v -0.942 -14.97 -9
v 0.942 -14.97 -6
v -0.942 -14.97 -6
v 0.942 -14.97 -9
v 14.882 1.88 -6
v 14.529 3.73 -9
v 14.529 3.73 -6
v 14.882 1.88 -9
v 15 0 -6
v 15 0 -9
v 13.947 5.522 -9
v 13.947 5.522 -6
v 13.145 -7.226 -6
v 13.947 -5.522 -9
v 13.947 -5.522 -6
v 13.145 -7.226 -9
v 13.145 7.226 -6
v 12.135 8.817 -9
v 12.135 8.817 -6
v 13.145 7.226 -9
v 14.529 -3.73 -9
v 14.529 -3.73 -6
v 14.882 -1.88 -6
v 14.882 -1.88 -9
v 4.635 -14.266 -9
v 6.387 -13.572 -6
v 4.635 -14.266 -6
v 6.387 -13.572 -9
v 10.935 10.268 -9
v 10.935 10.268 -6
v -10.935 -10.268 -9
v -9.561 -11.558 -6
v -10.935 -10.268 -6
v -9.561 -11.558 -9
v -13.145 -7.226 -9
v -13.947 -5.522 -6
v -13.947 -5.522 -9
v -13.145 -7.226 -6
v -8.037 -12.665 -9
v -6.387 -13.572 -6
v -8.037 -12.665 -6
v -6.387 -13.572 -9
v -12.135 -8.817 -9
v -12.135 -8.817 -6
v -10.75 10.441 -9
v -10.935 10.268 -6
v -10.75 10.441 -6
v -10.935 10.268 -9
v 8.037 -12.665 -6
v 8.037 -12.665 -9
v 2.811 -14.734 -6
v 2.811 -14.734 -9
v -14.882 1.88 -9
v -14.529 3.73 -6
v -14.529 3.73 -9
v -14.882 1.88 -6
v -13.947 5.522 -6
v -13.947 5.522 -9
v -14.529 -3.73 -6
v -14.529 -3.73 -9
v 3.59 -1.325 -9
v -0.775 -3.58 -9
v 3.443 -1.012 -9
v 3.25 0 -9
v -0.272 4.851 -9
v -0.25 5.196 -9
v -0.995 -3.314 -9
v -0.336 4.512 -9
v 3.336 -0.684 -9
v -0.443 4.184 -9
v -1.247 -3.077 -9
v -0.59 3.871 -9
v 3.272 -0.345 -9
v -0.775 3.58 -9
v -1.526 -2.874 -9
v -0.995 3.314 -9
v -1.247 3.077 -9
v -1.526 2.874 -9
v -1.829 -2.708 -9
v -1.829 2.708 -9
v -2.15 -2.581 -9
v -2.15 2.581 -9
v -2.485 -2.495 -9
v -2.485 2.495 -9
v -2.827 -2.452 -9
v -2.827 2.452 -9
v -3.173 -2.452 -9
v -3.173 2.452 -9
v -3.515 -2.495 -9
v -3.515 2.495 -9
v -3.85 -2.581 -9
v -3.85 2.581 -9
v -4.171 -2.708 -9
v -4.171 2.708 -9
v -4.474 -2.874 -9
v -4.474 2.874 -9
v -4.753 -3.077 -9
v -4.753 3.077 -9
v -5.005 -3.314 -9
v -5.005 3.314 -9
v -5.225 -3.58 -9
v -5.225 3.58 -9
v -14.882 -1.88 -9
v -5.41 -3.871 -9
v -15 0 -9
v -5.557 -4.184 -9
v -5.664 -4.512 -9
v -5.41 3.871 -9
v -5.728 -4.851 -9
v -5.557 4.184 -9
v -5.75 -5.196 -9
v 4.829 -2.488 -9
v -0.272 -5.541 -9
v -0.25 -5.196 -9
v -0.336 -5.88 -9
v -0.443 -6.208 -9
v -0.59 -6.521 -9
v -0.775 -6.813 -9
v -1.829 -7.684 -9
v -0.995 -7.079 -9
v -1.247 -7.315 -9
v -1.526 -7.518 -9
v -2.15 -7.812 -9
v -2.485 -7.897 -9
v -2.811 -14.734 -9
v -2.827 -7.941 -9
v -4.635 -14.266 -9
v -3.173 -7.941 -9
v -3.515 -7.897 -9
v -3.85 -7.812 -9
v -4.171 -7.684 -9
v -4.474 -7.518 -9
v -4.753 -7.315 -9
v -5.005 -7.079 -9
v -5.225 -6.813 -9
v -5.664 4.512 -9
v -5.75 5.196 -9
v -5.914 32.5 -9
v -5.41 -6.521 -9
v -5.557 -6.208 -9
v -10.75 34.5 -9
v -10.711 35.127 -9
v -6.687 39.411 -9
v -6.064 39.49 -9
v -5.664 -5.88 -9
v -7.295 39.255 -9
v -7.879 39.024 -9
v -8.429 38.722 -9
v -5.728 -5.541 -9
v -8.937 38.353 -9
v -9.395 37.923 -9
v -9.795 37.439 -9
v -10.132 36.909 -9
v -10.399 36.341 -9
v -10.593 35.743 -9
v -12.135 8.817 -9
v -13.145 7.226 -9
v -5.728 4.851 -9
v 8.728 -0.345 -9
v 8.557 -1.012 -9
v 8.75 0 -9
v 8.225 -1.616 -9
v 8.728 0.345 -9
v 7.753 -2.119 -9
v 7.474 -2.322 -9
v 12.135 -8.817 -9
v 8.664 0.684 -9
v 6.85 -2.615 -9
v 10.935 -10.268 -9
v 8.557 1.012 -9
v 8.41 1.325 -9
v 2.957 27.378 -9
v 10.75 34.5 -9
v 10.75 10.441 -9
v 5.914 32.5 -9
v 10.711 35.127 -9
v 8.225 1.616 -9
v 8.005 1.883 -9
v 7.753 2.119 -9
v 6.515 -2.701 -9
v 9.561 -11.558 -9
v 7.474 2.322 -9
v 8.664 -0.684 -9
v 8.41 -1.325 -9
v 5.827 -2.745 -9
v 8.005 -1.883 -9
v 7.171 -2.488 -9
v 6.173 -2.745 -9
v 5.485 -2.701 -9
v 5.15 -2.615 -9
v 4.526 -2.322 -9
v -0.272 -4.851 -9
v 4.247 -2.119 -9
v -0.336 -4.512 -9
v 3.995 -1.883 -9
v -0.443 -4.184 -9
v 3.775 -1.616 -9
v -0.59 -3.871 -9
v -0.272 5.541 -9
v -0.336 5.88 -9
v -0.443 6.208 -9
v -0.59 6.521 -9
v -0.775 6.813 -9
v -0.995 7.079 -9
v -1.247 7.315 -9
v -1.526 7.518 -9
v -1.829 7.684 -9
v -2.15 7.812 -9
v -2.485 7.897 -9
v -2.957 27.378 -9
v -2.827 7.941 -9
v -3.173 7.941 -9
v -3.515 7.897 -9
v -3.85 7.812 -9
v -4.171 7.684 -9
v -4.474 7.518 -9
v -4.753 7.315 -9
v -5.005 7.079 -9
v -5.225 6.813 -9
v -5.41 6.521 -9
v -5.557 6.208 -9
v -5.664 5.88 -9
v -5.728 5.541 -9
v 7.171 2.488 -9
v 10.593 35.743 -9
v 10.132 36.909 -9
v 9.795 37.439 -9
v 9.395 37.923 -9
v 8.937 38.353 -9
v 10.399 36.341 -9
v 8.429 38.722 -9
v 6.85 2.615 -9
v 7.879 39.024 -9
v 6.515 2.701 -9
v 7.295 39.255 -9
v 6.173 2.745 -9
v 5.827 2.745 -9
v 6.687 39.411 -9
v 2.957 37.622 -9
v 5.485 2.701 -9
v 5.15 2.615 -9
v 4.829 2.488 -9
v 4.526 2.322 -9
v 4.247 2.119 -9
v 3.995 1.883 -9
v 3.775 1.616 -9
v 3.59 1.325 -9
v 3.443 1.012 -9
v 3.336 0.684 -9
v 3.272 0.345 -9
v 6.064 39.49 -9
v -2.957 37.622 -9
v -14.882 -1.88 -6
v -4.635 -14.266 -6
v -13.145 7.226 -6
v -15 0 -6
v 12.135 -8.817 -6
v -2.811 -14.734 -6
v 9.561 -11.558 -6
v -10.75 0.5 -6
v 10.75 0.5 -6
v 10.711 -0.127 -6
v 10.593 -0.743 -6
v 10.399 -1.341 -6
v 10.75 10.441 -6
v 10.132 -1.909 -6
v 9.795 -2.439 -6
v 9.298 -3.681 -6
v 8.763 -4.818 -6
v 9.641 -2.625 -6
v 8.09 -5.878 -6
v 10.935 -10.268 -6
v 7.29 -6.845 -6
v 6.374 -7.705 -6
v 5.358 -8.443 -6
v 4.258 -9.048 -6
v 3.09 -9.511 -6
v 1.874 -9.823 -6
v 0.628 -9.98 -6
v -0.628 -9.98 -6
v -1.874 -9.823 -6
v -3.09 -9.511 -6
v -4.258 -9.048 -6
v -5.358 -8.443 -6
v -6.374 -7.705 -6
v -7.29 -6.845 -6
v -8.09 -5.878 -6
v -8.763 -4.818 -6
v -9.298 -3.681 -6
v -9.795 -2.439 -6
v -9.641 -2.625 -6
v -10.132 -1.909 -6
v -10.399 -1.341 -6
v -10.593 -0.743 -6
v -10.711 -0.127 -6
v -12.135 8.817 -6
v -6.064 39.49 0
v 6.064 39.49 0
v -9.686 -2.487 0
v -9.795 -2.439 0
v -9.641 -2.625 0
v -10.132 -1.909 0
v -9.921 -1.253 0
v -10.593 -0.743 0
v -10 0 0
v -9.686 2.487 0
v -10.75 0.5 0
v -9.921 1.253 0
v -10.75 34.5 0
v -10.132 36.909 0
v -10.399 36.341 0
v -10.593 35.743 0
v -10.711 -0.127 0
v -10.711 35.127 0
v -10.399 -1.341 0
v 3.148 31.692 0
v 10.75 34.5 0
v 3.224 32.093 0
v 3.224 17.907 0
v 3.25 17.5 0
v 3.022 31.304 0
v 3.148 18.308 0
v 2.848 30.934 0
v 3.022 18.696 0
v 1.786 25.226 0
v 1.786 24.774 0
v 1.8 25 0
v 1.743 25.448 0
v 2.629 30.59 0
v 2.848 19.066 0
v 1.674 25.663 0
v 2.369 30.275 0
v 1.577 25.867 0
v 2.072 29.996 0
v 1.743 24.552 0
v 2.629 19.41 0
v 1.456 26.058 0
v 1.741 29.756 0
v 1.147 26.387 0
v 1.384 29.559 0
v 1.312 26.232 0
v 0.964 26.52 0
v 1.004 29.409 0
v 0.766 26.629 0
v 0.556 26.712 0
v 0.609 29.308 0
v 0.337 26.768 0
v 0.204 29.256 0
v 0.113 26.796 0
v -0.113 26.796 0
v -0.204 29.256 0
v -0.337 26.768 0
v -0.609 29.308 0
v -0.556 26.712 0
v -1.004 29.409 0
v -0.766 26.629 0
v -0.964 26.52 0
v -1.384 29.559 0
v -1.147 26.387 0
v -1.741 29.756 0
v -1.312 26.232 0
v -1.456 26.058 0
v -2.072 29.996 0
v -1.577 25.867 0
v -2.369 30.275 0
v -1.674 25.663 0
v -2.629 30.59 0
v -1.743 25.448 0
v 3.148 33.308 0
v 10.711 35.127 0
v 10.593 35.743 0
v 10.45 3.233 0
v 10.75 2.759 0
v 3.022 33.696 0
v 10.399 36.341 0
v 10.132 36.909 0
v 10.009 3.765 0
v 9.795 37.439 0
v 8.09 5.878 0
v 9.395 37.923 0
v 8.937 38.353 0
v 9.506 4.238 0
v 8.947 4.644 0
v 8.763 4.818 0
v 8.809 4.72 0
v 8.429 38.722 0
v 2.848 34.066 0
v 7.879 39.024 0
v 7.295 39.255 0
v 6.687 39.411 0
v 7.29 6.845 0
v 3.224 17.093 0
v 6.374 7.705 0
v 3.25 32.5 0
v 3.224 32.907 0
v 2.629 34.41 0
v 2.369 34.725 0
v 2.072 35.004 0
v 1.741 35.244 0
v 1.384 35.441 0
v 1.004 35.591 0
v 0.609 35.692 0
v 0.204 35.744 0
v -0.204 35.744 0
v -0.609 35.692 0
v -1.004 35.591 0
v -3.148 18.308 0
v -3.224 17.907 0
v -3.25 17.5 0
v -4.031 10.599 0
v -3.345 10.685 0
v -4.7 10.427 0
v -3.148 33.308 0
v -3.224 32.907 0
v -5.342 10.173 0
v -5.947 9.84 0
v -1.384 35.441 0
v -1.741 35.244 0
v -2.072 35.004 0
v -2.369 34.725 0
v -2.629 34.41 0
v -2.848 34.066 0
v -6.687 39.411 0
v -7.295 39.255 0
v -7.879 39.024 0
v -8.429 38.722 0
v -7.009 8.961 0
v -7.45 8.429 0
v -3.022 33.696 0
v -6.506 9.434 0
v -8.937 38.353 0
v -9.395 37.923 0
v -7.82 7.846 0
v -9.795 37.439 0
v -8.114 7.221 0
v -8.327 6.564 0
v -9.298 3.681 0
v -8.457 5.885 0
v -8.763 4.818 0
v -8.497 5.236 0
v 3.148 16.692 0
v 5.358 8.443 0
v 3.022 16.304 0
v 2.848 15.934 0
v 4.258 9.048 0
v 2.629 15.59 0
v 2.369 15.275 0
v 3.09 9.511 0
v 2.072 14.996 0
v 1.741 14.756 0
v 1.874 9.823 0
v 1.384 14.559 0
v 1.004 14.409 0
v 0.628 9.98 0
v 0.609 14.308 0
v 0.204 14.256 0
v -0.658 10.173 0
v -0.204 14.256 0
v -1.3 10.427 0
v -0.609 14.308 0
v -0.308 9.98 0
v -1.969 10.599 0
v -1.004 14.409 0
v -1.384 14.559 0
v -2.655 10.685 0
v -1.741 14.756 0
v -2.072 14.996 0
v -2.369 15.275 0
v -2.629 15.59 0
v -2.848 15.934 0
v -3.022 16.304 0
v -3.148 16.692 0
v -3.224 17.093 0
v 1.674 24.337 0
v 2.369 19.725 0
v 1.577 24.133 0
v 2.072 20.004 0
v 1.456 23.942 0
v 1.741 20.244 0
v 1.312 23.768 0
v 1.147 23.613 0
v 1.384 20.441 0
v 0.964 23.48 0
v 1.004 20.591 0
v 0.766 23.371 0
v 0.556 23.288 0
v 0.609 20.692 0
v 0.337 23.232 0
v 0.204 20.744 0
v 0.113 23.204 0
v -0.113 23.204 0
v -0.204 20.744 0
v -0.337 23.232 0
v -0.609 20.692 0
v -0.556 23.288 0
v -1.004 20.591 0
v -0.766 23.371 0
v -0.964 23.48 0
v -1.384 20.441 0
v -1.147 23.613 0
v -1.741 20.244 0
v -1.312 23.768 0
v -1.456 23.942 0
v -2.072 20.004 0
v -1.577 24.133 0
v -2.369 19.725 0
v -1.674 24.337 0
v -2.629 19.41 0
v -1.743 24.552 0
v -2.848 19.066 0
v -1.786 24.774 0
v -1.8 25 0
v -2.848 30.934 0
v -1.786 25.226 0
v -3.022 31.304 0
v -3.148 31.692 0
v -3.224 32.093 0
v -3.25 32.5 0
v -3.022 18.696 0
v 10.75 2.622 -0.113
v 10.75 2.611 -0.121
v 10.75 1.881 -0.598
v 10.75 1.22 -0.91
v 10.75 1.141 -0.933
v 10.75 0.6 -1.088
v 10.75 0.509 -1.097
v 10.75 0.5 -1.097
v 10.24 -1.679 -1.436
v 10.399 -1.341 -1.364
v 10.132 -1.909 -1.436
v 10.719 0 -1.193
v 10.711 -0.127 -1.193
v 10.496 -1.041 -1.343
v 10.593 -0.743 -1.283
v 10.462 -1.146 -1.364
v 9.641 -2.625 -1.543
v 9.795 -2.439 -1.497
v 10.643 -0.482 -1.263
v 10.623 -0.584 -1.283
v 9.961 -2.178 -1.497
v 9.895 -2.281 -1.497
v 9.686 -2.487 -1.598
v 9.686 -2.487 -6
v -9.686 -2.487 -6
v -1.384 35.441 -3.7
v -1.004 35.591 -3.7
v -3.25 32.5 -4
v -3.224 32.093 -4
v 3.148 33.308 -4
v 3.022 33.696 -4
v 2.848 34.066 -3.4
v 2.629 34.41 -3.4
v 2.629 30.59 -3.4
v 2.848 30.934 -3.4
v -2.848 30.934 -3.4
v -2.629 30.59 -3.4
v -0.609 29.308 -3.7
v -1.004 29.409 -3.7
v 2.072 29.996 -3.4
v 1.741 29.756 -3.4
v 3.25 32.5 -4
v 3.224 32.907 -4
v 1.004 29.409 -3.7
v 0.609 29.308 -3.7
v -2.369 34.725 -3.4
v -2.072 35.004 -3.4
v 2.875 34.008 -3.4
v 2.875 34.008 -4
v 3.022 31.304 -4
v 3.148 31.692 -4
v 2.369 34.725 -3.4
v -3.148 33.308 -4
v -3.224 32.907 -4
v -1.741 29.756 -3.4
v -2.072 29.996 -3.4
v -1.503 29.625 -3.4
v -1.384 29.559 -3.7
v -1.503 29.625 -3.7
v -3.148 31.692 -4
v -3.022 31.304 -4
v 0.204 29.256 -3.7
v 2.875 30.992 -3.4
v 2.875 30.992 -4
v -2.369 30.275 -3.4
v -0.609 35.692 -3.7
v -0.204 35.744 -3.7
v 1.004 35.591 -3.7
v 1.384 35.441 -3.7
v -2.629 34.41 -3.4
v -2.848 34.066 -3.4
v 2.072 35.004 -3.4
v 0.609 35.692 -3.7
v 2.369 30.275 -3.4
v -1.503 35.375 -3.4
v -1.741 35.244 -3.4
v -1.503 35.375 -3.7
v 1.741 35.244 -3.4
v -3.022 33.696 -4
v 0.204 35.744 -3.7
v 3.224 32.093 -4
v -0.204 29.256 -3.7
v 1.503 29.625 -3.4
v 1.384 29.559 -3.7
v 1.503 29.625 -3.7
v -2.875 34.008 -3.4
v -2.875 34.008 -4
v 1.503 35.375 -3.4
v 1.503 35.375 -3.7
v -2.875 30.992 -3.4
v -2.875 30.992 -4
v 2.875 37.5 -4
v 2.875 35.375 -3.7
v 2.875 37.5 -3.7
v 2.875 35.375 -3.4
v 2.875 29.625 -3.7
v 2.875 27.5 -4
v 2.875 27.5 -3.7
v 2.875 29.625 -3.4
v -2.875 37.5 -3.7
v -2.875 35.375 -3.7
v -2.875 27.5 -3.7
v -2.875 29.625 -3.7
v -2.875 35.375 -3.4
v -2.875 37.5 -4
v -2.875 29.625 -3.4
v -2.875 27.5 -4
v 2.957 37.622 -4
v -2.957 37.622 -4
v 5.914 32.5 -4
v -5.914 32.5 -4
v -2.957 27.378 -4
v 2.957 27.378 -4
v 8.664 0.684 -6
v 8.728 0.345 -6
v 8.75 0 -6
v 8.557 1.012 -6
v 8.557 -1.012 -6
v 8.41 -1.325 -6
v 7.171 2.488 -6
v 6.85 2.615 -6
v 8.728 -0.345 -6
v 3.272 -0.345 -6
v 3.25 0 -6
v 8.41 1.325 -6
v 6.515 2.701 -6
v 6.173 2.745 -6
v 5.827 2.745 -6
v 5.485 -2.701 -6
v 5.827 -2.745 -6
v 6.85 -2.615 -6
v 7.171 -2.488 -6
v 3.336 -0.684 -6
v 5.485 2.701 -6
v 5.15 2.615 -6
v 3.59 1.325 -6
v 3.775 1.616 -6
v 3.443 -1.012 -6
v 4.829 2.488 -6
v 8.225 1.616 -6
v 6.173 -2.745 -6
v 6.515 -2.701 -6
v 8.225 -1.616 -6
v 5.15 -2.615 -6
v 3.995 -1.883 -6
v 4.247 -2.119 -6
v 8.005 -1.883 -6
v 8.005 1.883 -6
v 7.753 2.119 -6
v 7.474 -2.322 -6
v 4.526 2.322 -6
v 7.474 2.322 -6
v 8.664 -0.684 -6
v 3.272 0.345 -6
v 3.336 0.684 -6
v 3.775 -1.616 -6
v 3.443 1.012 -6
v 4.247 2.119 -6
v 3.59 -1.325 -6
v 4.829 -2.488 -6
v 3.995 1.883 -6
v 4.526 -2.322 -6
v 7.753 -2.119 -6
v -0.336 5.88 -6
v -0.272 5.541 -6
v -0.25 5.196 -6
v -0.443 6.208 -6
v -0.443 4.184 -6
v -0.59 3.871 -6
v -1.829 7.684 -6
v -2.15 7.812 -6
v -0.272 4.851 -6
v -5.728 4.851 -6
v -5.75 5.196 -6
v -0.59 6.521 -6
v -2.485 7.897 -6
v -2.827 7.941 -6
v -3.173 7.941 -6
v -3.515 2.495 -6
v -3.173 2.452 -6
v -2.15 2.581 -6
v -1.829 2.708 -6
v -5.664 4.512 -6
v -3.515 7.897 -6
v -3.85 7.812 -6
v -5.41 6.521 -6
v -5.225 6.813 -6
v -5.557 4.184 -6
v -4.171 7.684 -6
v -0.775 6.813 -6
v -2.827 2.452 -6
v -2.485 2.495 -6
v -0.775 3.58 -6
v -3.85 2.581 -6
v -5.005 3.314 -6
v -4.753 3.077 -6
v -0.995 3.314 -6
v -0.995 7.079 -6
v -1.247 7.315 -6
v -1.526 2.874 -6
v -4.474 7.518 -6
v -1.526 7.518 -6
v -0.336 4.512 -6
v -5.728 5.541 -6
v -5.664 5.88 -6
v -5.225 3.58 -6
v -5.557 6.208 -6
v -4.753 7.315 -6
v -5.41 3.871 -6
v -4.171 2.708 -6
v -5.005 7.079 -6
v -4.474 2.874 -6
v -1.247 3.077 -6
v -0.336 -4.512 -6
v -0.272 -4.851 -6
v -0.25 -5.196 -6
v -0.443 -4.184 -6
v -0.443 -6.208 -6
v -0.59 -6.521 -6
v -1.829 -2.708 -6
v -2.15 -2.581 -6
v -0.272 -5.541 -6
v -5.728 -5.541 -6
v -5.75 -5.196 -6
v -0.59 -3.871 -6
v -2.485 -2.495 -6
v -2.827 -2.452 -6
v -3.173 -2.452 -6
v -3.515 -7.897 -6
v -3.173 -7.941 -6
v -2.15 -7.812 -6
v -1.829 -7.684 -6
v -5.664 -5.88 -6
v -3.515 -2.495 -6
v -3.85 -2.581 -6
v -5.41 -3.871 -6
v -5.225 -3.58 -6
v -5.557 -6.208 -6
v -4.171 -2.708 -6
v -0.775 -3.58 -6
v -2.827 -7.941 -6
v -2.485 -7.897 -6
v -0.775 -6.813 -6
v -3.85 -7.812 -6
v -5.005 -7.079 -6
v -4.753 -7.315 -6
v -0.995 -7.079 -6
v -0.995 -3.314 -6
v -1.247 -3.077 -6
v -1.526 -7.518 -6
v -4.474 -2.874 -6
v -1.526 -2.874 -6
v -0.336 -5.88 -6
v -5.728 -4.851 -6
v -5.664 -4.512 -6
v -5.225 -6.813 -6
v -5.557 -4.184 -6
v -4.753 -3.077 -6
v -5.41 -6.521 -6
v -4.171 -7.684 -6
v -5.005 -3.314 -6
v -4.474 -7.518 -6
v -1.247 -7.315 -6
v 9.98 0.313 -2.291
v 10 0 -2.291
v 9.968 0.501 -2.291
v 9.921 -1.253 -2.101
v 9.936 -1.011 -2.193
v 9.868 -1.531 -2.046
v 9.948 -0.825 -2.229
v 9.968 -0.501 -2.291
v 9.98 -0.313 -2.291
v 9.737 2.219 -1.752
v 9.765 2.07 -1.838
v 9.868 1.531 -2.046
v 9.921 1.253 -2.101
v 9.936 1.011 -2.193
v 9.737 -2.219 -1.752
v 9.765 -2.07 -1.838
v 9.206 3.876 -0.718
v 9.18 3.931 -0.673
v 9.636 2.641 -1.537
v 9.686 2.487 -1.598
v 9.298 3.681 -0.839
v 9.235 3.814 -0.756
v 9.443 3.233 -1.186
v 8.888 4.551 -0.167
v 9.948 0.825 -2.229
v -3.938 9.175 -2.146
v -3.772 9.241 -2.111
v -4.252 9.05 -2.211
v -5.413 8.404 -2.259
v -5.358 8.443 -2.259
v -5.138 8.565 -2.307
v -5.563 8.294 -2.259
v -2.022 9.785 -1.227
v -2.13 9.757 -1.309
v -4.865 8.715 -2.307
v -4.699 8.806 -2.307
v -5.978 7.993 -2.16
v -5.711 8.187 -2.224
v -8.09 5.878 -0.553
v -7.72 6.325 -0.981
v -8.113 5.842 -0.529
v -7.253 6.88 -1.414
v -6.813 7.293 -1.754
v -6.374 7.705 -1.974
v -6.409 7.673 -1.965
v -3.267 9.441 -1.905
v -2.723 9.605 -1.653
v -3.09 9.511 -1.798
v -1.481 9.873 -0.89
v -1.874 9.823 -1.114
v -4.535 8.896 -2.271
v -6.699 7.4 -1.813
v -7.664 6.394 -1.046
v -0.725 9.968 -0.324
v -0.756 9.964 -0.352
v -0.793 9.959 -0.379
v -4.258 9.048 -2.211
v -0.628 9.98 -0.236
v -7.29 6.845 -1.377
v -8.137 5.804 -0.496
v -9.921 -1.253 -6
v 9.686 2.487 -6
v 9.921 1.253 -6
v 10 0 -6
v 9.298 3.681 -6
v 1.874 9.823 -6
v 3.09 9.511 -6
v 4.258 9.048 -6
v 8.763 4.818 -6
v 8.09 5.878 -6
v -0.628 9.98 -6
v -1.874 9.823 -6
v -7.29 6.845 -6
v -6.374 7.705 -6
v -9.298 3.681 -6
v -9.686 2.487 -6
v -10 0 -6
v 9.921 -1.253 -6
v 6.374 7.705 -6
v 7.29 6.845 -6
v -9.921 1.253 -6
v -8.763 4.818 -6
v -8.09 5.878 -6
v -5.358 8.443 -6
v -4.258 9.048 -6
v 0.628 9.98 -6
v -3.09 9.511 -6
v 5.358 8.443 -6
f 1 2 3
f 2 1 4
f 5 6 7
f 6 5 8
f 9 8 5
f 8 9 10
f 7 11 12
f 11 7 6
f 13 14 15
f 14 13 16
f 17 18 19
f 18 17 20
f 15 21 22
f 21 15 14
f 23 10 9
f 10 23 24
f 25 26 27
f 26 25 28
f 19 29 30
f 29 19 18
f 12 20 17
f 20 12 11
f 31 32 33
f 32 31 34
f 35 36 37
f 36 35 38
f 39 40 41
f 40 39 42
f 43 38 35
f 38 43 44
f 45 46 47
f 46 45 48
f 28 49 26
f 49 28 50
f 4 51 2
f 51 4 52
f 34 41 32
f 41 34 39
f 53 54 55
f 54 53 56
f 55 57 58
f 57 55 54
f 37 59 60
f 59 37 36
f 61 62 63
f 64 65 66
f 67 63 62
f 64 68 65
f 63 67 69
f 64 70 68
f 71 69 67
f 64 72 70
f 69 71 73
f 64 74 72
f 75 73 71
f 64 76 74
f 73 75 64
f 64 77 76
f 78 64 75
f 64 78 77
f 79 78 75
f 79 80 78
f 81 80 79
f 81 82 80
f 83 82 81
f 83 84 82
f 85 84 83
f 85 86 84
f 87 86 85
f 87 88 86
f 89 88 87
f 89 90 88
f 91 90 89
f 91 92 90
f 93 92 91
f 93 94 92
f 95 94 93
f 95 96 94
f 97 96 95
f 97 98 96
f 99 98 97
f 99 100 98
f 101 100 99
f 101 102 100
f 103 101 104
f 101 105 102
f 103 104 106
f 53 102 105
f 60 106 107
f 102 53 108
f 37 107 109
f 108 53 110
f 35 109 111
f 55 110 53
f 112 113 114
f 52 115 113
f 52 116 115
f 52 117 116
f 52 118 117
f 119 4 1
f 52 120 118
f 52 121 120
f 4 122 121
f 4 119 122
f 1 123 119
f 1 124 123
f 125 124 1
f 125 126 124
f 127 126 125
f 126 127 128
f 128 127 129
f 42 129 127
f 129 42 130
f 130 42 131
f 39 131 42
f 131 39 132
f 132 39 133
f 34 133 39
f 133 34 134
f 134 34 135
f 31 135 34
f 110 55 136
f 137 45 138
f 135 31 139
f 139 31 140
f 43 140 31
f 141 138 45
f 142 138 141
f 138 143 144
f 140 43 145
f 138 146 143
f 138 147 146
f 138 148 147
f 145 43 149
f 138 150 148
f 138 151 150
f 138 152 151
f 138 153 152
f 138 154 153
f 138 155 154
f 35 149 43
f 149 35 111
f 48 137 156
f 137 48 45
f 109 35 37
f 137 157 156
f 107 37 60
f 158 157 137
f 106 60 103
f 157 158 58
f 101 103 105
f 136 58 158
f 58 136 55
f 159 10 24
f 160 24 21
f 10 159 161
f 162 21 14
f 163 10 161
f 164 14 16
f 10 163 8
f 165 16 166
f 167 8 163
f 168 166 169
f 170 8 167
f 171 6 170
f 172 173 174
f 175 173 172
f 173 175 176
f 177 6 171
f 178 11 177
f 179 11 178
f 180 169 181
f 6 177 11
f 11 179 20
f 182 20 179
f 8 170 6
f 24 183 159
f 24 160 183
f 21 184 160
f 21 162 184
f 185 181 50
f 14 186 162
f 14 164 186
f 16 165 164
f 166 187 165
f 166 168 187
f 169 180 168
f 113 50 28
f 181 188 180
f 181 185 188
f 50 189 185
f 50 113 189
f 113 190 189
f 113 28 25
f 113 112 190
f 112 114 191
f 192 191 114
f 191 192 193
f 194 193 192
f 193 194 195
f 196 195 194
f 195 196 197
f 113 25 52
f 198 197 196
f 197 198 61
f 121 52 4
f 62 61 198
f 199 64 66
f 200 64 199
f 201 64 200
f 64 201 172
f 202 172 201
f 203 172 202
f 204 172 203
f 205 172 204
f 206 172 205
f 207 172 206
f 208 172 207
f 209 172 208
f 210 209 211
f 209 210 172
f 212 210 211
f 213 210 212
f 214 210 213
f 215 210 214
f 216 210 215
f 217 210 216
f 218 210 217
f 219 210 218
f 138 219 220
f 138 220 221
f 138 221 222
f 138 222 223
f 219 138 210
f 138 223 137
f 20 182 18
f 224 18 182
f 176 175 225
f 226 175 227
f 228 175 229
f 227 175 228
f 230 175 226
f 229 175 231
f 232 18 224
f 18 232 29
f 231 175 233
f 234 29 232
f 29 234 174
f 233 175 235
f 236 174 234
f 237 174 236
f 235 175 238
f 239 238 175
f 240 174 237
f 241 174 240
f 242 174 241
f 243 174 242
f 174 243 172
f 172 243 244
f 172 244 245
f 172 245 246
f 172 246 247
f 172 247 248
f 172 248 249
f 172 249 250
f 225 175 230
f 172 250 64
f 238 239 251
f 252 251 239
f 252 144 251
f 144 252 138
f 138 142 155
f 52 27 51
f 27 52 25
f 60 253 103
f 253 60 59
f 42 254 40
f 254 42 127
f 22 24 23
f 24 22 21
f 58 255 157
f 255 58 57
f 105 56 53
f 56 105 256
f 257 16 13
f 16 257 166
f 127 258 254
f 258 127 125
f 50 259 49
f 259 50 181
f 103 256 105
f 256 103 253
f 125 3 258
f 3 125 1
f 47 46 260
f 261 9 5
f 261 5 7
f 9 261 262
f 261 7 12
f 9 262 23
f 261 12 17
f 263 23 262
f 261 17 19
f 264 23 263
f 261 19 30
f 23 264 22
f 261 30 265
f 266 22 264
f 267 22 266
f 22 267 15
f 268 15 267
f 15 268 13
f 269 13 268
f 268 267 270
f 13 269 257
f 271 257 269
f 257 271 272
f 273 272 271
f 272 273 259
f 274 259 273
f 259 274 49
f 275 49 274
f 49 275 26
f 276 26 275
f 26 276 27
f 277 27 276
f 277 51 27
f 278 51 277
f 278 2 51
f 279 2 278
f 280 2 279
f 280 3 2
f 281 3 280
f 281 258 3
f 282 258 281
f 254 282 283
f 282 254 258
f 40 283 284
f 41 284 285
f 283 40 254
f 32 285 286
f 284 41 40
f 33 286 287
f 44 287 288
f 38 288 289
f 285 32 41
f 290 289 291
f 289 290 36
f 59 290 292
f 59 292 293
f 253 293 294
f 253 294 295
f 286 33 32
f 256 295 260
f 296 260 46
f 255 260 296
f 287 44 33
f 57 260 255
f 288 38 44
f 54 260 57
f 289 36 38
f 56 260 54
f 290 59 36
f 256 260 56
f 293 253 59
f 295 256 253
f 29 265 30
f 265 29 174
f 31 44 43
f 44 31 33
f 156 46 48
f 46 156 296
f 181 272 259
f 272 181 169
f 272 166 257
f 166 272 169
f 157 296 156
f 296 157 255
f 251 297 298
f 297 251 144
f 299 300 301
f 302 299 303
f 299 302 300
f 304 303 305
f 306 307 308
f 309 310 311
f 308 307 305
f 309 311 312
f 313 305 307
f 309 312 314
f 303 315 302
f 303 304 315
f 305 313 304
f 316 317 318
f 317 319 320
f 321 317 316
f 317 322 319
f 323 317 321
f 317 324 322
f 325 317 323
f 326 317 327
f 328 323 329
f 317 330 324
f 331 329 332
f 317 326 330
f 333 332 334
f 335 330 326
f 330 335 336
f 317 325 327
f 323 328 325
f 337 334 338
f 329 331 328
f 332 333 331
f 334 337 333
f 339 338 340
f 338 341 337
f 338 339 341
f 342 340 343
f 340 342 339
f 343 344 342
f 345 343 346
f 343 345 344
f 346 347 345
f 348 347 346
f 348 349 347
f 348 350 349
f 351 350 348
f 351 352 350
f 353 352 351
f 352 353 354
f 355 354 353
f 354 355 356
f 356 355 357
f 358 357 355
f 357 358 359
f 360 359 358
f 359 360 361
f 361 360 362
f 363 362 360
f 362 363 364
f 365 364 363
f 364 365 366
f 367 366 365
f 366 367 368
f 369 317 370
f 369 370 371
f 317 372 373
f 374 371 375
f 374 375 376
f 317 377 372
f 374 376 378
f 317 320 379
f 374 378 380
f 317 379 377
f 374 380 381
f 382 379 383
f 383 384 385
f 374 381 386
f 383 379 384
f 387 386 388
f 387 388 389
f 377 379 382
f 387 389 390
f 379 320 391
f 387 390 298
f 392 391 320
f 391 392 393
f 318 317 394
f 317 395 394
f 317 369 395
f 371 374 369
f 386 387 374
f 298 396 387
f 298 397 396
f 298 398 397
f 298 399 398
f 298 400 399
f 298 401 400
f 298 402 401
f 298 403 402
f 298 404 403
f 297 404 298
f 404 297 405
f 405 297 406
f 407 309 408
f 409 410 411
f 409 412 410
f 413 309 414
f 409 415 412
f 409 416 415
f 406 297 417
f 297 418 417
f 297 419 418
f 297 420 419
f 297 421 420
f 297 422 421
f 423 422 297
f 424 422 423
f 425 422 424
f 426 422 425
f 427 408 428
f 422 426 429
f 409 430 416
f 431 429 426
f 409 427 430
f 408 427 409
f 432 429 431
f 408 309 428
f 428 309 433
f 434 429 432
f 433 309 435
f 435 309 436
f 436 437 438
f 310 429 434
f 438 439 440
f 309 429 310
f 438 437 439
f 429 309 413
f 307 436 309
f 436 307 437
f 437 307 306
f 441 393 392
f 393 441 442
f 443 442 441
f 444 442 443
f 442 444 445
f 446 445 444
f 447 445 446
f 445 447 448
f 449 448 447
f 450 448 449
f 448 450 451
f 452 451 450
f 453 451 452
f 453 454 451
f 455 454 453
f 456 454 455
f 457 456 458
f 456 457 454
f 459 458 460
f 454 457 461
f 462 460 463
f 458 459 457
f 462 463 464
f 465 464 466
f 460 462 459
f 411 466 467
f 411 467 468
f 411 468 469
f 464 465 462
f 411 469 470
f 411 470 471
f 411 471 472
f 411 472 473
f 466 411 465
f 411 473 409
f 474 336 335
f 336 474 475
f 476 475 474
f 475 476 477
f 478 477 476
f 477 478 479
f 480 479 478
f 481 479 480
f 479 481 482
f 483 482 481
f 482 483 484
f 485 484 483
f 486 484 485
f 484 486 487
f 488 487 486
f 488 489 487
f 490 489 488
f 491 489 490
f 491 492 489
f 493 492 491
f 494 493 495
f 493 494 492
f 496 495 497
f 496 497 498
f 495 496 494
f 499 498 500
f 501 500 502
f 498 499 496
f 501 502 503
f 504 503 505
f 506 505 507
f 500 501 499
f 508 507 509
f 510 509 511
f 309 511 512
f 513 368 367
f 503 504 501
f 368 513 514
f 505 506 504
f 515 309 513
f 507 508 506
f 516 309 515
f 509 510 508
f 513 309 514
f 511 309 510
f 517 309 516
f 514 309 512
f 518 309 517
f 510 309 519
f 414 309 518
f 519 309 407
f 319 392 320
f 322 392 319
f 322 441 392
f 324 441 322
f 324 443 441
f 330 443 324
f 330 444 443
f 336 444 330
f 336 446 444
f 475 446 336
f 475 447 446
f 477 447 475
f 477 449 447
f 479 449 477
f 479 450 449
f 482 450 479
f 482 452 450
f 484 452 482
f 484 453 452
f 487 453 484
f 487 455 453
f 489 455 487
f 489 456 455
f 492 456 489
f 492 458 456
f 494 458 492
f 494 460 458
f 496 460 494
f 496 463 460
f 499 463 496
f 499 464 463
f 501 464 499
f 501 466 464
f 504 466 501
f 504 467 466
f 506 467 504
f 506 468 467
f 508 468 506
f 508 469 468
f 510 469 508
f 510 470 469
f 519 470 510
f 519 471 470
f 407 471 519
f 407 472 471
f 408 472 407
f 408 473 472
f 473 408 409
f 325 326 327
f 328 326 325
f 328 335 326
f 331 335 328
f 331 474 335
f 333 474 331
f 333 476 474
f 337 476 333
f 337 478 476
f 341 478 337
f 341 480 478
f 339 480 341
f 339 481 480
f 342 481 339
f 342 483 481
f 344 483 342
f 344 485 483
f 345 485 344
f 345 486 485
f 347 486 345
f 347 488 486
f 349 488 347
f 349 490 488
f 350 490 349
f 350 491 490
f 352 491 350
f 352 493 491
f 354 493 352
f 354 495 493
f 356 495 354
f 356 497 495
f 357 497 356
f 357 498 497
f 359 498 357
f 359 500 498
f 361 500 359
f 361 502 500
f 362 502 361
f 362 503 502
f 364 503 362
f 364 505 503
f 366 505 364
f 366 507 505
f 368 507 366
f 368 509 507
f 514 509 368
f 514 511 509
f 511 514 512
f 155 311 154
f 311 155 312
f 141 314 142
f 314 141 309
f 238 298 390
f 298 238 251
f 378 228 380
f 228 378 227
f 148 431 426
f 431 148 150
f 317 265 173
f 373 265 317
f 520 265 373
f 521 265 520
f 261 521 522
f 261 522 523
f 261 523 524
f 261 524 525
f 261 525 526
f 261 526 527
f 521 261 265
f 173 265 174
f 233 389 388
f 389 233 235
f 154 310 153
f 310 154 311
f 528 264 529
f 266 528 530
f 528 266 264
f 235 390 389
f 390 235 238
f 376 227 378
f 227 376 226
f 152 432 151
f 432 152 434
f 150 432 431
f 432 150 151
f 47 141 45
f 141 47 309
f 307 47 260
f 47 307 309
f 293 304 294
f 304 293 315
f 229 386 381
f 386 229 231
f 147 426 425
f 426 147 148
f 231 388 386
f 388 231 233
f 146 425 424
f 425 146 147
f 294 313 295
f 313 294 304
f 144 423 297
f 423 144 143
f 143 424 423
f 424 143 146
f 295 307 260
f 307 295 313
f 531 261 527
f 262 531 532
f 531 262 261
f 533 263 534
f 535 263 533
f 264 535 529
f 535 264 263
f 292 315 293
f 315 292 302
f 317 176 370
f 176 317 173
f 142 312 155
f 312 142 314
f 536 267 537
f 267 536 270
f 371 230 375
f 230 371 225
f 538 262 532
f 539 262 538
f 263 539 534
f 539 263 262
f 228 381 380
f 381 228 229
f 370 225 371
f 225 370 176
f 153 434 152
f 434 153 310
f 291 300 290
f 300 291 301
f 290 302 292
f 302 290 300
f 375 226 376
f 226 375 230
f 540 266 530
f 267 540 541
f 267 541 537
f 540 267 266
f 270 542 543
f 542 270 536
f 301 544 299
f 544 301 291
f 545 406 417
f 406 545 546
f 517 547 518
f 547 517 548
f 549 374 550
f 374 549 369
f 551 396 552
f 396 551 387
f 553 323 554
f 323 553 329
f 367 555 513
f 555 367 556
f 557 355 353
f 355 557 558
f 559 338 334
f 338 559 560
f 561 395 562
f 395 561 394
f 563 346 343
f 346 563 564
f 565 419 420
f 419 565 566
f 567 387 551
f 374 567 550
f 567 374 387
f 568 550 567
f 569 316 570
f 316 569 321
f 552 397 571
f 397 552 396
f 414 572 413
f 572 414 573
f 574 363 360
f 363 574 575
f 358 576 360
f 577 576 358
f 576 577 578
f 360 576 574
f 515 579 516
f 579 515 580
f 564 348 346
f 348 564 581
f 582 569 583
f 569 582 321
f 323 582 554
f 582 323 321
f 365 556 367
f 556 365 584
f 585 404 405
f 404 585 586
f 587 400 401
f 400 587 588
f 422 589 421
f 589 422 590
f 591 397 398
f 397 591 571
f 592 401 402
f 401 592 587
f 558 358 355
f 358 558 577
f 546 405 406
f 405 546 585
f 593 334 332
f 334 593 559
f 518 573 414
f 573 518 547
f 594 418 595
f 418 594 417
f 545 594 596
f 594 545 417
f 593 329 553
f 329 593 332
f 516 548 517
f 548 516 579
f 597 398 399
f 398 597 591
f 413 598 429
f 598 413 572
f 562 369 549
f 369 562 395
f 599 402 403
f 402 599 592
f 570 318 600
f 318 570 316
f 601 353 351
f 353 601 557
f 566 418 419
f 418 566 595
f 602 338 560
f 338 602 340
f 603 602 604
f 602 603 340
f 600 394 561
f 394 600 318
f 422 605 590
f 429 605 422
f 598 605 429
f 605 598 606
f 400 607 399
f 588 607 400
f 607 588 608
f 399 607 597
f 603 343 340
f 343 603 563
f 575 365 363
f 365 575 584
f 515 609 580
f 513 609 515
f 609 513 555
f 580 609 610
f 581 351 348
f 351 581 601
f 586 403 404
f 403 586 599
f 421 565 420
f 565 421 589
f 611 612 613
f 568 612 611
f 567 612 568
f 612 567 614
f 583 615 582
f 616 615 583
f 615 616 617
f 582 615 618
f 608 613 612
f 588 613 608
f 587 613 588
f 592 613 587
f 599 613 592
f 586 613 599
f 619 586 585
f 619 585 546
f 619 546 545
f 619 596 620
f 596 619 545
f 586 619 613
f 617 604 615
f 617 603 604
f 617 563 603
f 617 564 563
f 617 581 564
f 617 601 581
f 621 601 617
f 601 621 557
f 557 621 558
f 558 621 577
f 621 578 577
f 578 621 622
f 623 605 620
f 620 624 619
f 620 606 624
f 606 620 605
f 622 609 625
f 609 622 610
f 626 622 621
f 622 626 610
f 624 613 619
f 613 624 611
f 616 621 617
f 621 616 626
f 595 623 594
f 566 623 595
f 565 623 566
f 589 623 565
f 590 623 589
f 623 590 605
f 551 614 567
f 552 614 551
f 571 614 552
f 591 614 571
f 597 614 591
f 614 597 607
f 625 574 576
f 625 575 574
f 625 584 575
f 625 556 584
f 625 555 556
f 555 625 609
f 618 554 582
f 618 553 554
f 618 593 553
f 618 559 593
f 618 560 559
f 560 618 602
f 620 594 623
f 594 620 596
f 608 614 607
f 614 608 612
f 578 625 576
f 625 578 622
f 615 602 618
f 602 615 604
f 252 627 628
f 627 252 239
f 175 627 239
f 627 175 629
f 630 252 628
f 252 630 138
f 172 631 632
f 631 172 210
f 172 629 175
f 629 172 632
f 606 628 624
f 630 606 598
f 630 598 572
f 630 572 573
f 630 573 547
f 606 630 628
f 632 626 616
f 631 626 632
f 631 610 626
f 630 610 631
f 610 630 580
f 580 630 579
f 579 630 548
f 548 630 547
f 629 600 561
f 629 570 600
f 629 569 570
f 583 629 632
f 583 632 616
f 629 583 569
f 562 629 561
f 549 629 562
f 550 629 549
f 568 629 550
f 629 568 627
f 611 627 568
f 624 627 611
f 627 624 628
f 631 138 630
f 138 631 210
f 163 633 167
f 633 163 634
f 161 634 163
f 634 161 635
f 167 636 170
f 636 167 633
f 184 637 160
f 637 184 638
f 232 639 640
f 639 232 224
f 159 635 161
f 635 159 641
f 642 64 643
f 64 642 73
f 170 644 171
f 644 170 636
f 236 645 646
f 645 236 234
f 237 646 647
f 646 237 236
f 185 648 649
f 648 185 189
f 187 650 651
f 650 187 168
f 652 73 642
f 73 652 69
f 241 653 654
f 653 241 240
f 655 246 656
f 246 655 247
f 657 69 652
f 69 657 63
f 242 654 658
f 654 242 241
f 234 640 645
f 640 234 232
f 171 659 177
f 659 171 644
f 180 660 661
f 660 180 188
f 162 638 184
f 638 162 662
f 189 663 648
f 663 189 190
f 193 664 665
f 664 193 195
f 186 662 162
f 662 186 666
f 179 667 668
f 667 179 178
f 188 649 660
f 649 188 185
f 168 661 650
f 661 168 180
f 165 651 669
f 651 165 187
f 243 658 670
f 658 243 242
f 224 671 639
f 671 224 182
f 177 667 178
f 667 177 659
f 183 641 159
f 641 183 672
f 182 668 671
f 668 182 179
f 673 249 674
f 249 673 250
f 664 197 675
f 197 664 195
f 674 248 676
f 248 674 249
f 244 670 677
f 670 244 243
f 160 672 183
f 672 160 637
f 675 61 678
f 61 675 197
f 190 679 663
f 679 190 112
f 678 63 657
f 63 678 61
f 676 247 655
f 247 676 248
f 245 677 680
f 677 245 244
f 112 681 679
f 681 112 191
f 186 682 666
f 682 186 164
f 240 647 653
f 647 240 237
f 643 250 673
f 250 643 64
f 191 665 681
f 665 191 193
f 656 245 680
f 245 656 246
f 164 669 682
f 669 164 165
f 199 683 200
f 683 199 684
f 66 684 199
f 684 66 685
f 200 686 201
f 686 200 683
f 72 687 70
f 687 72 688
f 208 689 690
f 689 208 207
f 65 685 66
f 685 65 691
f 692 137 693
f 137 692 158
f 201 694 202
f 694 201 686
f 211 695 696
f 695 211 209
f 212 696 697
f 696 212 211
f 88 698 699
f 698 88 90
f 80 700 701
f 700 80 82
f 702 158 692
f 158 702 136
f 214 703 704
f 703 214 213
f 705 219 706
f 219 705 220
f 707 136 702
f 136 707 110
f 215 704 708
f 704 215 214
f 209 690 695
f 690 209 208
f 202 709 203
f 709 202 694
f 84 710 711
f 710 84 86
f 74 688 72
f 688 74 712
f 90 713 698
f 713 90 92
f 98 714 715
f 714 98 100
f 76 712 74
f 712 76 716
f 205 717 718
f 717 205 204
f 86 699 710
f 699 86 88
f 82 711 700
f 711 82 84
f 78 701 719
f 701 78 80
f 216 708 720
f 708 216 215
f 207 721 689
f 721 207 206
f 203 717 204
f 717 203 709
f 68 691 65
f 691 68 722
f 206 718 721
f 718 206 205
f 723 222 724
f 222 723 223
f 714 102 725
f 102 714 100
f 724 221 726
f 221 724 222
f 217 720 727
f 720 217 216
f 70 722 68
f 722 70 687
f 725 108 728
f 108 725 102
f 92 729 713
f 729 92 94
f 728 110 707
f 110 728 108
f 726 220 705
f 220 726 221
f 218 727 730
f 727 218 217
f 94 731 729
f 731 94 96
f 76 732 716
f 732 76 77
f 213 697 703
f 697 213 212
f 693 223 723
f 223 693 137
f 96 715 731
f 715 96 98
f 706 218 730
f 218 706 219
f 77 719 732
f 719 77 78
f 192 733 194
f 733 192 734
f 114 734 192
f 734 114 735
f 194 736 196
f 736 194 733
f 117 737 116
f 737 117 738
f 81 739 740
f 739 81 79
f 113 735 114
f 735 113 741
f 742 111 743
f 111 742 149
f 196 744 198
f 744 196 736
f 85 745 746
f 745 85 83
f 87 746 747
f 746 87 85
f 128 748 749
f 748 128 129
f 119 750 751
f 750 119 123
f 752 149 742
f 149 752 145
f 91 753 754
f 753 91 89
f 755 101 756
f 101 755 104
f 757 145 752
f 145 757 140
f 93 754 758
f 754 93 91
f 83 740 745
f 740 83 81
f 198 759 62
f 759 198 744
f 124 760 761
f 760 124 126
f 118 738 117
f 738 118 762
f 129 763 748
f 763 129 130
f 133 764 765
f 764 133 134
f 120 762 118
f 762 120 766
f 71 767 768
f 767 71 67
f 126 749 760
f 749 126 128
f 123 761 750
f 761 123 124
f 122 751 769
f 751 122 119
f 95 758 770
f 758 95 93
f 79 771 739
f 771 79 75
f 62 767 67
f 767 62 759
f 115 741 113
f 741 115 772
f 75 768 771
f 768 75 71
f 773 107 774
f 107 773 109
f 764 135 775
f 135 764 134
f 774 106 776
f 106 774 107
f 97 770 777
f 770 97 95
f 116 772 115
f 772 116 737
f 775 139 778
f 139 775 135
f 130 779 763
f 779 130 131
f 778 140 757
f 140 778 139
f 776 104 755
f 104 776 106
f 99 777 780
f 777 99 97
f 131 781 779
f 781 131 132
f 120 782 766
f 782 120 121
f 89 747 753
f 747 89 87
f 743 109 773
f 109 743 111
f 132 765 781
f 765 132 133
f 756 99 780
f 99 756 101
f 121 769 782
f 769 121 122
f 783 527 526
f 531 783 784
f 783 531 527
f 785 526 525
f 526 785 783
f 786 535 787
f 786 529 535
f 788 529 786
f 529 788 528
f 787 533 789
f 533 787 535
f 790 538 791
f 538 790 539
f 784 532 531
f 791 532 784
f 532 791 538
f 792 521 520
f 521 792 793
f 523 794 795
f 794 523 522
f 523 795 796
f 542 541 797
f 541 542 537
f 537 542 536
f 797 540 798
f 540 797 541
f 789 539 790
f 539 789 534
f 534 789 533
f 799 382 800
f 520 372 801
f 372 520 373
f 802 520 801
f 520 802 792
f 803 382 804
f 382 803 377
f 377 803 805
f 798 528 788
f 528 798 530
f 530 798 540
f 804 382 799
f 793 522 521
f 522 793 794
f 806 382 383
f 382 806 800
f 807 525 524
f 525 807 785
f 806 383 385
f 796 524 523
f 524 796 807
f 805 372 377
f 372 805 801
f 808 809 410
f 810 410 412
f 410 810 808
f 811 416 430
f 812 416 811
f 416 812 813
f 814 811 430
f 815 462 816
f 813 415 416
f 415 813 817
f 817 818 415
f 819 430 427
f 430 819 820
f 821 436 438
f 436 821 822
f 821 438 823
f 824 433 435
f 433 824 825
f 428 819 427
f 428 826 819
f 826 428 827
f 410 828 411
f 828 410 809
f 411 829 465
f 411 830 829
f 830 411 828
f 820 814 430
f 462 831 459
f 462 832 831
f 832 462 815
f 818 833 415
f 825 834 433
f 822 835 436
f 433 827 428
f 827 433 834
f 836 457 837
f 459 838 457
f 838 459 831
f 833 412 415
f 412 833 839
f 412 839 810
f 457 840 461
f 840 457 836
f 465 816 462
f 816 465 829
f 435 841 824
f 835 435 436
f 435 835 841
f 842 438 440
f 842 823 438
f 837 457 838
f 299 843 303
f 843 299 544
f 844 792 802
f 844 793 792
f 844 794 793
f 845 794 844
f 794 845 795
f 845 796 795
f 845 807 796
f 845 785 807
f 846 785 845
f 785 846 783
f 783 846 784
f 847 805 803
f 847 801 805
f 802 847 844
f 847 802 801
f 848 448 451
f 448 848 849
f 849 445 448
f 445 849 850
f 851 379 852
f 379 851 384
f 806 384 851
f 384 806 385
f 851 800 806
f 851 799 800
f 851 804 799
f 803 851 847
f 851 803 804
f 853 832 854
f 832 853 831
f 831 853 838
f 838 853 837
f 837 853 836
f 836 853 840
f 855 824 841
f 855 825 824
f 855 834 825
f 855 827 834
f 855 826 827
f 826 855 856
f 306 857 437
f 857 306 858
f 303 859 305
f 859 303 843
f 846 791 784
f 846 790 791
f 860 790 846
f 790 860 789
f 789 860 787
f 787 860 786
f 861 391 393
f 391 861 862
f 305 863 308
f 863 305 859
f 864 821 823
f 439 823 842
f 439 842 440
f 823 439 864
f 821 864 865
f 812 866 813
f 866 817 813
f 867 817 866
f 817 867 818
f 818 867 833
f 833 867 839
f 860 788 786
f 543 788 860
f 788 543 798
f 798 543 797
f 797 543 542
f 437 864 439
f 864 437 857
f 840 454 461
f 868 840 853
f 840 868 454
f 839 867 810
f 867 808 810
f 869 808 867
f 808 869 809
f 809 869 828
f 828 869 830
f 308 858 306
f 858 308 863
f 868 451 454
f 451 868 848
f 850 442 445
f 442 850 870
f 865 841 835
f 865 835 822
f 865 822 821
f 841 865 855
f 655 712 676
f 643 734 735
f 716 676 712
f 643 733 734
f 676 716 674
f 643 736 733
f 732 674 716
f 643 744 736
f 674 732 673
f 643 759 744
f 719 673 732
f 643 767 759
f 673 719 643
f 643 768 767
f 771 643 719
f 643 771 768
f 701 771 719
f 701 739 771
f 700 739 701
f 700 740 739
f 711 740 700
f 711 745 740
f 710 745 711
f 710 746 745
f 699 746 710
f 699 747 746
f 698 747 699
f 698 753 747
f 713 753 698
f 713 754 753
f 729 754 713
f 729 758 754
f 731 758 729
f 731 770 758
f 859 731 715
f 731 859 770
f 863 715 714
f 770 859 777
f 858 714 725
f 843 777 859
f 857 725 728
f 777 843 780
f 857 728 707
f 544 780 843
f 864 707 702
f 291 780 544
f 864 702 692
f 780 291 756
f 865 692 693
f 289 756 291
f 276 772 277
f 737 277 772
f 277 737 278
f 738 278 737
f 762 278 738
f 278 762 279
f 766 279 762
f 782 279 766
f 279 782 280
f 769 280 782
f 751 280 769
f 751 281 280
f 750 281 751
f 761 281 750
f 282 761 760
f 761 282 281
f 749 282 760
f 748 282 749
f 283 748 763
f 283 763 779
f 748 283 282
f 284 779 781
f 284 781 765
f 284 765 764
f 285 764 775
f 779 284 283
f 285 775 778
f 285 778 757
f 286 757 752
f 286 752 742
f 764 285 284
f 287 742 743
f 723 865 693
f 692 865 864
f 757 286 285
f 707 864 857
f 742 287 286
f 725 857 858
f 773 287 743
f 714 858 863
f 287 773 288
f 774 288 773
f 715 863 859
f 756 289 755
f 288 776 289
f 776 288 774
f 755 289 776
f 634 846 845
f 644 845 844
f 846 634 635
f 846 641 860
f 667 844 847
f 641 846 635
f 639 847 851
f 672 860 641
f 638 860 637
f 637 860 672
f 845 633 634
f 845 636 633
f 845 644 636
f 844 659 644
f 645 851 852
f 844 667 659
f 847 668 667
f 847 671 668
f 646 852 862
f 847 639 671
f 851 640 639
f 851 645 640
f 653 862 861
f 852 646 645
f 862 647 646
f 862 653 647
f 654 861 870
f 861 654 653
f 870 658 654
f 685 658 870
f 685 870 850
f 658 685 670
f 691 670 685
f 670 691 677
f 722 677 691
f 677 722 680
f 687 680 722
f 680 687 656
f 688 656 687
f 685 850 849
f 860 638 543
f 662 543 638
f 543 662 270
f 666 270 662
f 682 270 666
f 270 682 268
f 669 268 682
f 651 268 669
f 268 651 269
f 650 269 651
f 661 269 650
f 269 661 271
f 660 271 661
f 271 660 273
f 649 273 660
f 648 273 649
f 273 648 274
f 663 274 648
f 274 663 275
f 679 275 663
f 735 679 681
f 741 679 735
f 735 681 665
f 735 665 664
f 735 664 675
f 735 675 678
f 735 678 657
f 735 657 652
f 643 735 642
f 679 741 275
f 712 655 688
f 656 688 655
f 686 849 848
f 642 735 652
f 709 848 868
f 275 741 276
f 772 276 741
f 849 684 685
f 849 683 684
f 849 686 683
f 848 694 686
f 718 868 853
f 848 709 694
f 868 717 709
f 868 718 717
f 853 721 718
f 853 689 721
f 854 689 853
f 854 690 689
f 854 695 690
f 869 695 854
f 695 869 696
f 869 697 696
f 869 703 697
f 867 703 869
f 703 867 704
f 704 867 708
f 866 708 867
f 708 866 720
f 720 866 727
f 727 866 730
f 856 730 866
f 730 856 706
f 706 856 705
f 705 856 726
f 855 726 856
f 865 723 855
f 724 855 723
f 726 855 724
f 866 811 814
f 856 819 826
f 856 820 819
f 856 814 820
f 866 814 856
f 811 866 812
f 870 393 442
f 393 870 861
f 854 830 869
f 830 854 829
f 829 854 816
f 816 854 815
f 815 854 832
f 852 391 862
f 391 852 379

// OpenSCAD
$fn = 50;


difference() {
	union() {
		translate(v = [0, 0, -9.0000000000]) {
			cylinder(h = 3, r = 15.0000000000);
		}
		translate(v = [0, 17.5000000000, -9]) {
			hull() {
				translate(v = [-2.0000000000, 17.0000000000, 0]) {
					cylinder(h = 9, r = 5);
				}
				translate(v = [2.0000000000, 17.0000000000, 0]) {
					cylinder(h = 9, r = 5);
				}
				translate(v = [-2.0000000000, -17.0000000000, 0]) {
					cylinder(h = 9, r = 5);
				}
				translate(v = [2.0000000000, -17.0000000000, 0]) {
					cylinder(h = 9, r = 5);
				}
			}
		}
		translate(v = [0, 17.5000000000, -9]) {
			hull() {
				translate(v = [-5.7500000000, 17.0000000000, 0]) {
					cylinder(h = 9, r = 5);
				}
				translate(v = [5.7500000000, 17.0000000000, 0]) {
					cylinder(h = 9, r = 5);
				}
				translate(v = [-5.7500000000, -17.0000000000, 0]) {
					cylinder(h = 9, r = 5);
				}
				translate(v = [5.7500000000, -17.0000000000, 0]) {
					cylinder(h = 9, r = 5);
				}
			}
		}
		translate(v = [0, 0, -9.0000000000]) {
			cylinder(h = 9, r = 10.0000000000);
		}
	}
	union() {
		translate(v = [0, 32.5000000000, 0]) {
			rotate(a = [0, 0, 0]) {
				difference() {
					union() {
						translate(v = [0, 0, -50.0000000000]) {
							cylinder(h = 100, r = 3.2500000000);
						}
					}
					union();
				}
			}
		}
		translate(v = [0, 32.5000000000, -9]) {
			rotate(a = [0, 0, 0]) {
				difference() {
					union() {
						translate(v = [-2.8750000000, -5.0000000000, -0.3000000000]) {
							cube(size = [5.7500000000, 10, 0.3000000000]);
						}
						translate(v = [-2.8750000000, -2.8750000000, -0.6000000000]) {
							cube(size = [5.7500000000, 5.7500000000, 0.3000000000]);
						}
						translate(v = [-2.8750000000, -5.0000000000, 5]) {
							cube(size = [5.7500000000, 10, 0.3000000000]);
						}
						translate(v = [-2.8750000000, -2.8750000000, 5.3000000000]) {
							cube(size = [5.7500000000, 5.7500000000, 0.3000000000]);
						}
						linear_extrude(height = 5) {
							polygon(points = [[5.9142500000, 0.0000000000], [2.9571250000, 5.1218907443], [-2.9571250000, 5.1218907443], [-5.9142500000, 0.0000000000], [-2.9571250000, -5.1218907443], [2.9571250000, -5.1218907443]]);
						}
						translate(v = [-2.8750000000, -5.0000000000, -0.3000000000]) {
							cube(size = [5.7500000000, 10, 0.3000000000]);
						}
						translate(v = [-2.8750000000, -2.8750000000, -0.6000000000]) {
							cube(size = [5.7500000000, 5.7500000000, 0.3000000000]);
						}
						translate(v = [-2.8750000000, -5.0000000000, 5]) {
							cube(size = [5.7500000000, 10, 0.3000000000]);
						}
						translate(v = [-2.8750000000, -2.8750000000, 5.3000000000]) {
							cube(size = [5.7500000000, 5.7500000000, 0.3000000000]);
						}
						translate(v = [-2.8750000000, -5.0000000000, -0.3000000000]) {
							cube(size = [5.7500000000, 10, 0.3000000000]);
						}
						translate(v = [-2.8750000000, -2.8750000000, -0.6000000000]) {
							cube(size = [5.7500000000, 5.7500000000, 0.3000000000]);
						}
						translate(v = [-2.8750000000, -5.0000000000, 5]) {
							cube(size = [5.7500000000, 10, 0.3000000000]);
						}
						translate(v = [-2.8750000000, -2.8750000000, 5.3000000000]) {
							cube(size = [5.7500000000, 5.7500000000, 0.3000000000]);
						}
					}
					union();
				}
			}
		}
		translate(v = [6.0000000000, 0.0000000000, 41]) {
			rotate(a = [0, 0, 0]) {
				difference() {
					union() {
						translate(v = [0, 0, -59.0000000000]) {
							cylinder(h = 59, r = 2.2500000000);
						}
						translate(v = [0, 0, -4.2000000000]) {
							cylinder(h = 4.2000000000, r1 = 2.7500000000, r2 = 5.5000000000);
						}
						translate(v = [0, 0, -59.0000000000]) {
							cylinder(h = 59, r = 2.7500000000);
						}
						translate(v = [0, 0, -59.0000000000]) {
							cylinder(h = 59, r = 2.2500000000);
						}
					}
					union();
				}
			}
		}
		translate(v = [-3.0000000000, 5.1961524227, 41]) {
			rotate(a = [0, 0, 0]) {
				difference() {
					union() {
						translate(v = [0, 0, -59.0000000000]) {
							cylinder(h = 59, r = 2.2500000000);
						}
						translate(v = [0, 0, -4.2000000000]) {
							cylinder(h = 4.2000000000, r1 = 2.7500000000, r2 = 5.5000000000);
						}
						translate(v = [0, 0, -59.0000000000]) {
							cylinder(h = 59, r = 2.7500000000);
						}
						translate(v = [0, 0, -59.0000000000]) {
							cylinder(h = 59, r = 2.2500000000);
						}
					}
					union();
				}
			}
		}
		translate(v = [-3.0000000000, -5.1961524227, 41]) {
			rotate(a = [0, 0, 0]) {
				difference() {
					union() {
						translate(v = [0, 0, -59.0000000000]) {
							cylinder(h = 59, r = 2.2500000000);
						}
						translate(v = [0, 0, -4.2000000000]) {
							cylinder(h = 4.2000000000, r1 = 2.7500000000, r2 = 5.5000000000);
						}
						translate(v = [0, 0, -59.0000000000]) {
							cylinder(h = 59, r = 2.7500000000);
						}
						translate(v = [0, 0, -59.0000000000]) {
							cylinder(h = 59, r = 2.2500000000);
						}
					}
					union();
				}
			}
		}
		translate(v = [6.0000000000, 0.0000000000, 0]) {
			rotate(a = [0, 0, 0]) {
				difference() {
					union() {
						#translate(v = [0, 0, -9.0000000000]) {
							cylinder(h = 9, r = 2.2500000000);
						}
						#translate(v = [0, 0, -4.2000000000]) {
							cylinder(h = 4.2000000000, r = 10.0000000000, r1 = 2.7500000000, r2 = 5.5000000000);
						}
						#translate(v = [0, 0, -9.0000000000]) {
							cylinder(h = 9, r = 2.7500000000);
						}
						#translate(v = [0, 0, -9.0000000000]) {
							cylinder(h = 9, r = 2.2500000000);
						}
					}
					union();
				}
			}
		}
		translate(v = [-3.0000000000, 5.1961524227, 0]) {
			rotate(a = [0, 0, 0]) {
				difference() {
					union() {
						#translate(v = [0, 0, -9.0000000000]) {
							cylinder(h = 9, r = 2.2500000000);
						}
						#translate(v = [0, 0, -4.2000000000]) {
							cylinder(h = 4.2000000000, r = 10.0000000000, r1 = 2.7500000000, r2 = 5.5000000000);
						}
						#translate(v = [0, 0, -9.0000000000]) {
							cylinder(h = 9, r = 2.7500000000);
						}
						#translate(v = [0, 0, -9.0000000000]) {
							cylinder(h = 9, r = 2.2500000000);
						}
					}
					union();
				}
			}
		}
		translate(v = [-3.0000000000, -5.1961524227, 0]) {
			rotate(a = [0, 0, 0]) {
				difference() {
					union() {
						#translate(v = [0, 0, -9.0000000000]) {
							cylinder(h = 9, r = 2.2500000000);
						}
						#translate(v = [0, 0, -4.2000000000]) {
							cylinder(h = 4.2000000000, r = 10.0000000000, r1 = 2.7500000000, r2 = 5.5000000000);
						}
						#translate(v = [0, 0, -9.0000000000]) {
							cylinder(h = 9, r = 2.7500000000);
						}
						#translate(v = [0, 0, -9.0000000000]) {
							cylinder(h = 9, r = 2.2500000000);
						}
					}
					union();
				}
			}
		}
		translate(v = [0, 0, -6.0000000000]) {
			cylinder(h = 100, r = 10.0000000000);
		}
		translate(v = [0.0000000000, 32.5000000000, 0]) {
			cylinder(h = 9, r = 3.2500000000);
		}
		translate(v = [0.0000000000, 17.5000000000, 0]) {
			cylinder(h = 9, r = 3.2500000000);
		}
		translate(v = [0.0000000000, 25.0000000000, 0]) {
			cylinder(h = 9, r = 1.8000000000);
		}
	}
}
